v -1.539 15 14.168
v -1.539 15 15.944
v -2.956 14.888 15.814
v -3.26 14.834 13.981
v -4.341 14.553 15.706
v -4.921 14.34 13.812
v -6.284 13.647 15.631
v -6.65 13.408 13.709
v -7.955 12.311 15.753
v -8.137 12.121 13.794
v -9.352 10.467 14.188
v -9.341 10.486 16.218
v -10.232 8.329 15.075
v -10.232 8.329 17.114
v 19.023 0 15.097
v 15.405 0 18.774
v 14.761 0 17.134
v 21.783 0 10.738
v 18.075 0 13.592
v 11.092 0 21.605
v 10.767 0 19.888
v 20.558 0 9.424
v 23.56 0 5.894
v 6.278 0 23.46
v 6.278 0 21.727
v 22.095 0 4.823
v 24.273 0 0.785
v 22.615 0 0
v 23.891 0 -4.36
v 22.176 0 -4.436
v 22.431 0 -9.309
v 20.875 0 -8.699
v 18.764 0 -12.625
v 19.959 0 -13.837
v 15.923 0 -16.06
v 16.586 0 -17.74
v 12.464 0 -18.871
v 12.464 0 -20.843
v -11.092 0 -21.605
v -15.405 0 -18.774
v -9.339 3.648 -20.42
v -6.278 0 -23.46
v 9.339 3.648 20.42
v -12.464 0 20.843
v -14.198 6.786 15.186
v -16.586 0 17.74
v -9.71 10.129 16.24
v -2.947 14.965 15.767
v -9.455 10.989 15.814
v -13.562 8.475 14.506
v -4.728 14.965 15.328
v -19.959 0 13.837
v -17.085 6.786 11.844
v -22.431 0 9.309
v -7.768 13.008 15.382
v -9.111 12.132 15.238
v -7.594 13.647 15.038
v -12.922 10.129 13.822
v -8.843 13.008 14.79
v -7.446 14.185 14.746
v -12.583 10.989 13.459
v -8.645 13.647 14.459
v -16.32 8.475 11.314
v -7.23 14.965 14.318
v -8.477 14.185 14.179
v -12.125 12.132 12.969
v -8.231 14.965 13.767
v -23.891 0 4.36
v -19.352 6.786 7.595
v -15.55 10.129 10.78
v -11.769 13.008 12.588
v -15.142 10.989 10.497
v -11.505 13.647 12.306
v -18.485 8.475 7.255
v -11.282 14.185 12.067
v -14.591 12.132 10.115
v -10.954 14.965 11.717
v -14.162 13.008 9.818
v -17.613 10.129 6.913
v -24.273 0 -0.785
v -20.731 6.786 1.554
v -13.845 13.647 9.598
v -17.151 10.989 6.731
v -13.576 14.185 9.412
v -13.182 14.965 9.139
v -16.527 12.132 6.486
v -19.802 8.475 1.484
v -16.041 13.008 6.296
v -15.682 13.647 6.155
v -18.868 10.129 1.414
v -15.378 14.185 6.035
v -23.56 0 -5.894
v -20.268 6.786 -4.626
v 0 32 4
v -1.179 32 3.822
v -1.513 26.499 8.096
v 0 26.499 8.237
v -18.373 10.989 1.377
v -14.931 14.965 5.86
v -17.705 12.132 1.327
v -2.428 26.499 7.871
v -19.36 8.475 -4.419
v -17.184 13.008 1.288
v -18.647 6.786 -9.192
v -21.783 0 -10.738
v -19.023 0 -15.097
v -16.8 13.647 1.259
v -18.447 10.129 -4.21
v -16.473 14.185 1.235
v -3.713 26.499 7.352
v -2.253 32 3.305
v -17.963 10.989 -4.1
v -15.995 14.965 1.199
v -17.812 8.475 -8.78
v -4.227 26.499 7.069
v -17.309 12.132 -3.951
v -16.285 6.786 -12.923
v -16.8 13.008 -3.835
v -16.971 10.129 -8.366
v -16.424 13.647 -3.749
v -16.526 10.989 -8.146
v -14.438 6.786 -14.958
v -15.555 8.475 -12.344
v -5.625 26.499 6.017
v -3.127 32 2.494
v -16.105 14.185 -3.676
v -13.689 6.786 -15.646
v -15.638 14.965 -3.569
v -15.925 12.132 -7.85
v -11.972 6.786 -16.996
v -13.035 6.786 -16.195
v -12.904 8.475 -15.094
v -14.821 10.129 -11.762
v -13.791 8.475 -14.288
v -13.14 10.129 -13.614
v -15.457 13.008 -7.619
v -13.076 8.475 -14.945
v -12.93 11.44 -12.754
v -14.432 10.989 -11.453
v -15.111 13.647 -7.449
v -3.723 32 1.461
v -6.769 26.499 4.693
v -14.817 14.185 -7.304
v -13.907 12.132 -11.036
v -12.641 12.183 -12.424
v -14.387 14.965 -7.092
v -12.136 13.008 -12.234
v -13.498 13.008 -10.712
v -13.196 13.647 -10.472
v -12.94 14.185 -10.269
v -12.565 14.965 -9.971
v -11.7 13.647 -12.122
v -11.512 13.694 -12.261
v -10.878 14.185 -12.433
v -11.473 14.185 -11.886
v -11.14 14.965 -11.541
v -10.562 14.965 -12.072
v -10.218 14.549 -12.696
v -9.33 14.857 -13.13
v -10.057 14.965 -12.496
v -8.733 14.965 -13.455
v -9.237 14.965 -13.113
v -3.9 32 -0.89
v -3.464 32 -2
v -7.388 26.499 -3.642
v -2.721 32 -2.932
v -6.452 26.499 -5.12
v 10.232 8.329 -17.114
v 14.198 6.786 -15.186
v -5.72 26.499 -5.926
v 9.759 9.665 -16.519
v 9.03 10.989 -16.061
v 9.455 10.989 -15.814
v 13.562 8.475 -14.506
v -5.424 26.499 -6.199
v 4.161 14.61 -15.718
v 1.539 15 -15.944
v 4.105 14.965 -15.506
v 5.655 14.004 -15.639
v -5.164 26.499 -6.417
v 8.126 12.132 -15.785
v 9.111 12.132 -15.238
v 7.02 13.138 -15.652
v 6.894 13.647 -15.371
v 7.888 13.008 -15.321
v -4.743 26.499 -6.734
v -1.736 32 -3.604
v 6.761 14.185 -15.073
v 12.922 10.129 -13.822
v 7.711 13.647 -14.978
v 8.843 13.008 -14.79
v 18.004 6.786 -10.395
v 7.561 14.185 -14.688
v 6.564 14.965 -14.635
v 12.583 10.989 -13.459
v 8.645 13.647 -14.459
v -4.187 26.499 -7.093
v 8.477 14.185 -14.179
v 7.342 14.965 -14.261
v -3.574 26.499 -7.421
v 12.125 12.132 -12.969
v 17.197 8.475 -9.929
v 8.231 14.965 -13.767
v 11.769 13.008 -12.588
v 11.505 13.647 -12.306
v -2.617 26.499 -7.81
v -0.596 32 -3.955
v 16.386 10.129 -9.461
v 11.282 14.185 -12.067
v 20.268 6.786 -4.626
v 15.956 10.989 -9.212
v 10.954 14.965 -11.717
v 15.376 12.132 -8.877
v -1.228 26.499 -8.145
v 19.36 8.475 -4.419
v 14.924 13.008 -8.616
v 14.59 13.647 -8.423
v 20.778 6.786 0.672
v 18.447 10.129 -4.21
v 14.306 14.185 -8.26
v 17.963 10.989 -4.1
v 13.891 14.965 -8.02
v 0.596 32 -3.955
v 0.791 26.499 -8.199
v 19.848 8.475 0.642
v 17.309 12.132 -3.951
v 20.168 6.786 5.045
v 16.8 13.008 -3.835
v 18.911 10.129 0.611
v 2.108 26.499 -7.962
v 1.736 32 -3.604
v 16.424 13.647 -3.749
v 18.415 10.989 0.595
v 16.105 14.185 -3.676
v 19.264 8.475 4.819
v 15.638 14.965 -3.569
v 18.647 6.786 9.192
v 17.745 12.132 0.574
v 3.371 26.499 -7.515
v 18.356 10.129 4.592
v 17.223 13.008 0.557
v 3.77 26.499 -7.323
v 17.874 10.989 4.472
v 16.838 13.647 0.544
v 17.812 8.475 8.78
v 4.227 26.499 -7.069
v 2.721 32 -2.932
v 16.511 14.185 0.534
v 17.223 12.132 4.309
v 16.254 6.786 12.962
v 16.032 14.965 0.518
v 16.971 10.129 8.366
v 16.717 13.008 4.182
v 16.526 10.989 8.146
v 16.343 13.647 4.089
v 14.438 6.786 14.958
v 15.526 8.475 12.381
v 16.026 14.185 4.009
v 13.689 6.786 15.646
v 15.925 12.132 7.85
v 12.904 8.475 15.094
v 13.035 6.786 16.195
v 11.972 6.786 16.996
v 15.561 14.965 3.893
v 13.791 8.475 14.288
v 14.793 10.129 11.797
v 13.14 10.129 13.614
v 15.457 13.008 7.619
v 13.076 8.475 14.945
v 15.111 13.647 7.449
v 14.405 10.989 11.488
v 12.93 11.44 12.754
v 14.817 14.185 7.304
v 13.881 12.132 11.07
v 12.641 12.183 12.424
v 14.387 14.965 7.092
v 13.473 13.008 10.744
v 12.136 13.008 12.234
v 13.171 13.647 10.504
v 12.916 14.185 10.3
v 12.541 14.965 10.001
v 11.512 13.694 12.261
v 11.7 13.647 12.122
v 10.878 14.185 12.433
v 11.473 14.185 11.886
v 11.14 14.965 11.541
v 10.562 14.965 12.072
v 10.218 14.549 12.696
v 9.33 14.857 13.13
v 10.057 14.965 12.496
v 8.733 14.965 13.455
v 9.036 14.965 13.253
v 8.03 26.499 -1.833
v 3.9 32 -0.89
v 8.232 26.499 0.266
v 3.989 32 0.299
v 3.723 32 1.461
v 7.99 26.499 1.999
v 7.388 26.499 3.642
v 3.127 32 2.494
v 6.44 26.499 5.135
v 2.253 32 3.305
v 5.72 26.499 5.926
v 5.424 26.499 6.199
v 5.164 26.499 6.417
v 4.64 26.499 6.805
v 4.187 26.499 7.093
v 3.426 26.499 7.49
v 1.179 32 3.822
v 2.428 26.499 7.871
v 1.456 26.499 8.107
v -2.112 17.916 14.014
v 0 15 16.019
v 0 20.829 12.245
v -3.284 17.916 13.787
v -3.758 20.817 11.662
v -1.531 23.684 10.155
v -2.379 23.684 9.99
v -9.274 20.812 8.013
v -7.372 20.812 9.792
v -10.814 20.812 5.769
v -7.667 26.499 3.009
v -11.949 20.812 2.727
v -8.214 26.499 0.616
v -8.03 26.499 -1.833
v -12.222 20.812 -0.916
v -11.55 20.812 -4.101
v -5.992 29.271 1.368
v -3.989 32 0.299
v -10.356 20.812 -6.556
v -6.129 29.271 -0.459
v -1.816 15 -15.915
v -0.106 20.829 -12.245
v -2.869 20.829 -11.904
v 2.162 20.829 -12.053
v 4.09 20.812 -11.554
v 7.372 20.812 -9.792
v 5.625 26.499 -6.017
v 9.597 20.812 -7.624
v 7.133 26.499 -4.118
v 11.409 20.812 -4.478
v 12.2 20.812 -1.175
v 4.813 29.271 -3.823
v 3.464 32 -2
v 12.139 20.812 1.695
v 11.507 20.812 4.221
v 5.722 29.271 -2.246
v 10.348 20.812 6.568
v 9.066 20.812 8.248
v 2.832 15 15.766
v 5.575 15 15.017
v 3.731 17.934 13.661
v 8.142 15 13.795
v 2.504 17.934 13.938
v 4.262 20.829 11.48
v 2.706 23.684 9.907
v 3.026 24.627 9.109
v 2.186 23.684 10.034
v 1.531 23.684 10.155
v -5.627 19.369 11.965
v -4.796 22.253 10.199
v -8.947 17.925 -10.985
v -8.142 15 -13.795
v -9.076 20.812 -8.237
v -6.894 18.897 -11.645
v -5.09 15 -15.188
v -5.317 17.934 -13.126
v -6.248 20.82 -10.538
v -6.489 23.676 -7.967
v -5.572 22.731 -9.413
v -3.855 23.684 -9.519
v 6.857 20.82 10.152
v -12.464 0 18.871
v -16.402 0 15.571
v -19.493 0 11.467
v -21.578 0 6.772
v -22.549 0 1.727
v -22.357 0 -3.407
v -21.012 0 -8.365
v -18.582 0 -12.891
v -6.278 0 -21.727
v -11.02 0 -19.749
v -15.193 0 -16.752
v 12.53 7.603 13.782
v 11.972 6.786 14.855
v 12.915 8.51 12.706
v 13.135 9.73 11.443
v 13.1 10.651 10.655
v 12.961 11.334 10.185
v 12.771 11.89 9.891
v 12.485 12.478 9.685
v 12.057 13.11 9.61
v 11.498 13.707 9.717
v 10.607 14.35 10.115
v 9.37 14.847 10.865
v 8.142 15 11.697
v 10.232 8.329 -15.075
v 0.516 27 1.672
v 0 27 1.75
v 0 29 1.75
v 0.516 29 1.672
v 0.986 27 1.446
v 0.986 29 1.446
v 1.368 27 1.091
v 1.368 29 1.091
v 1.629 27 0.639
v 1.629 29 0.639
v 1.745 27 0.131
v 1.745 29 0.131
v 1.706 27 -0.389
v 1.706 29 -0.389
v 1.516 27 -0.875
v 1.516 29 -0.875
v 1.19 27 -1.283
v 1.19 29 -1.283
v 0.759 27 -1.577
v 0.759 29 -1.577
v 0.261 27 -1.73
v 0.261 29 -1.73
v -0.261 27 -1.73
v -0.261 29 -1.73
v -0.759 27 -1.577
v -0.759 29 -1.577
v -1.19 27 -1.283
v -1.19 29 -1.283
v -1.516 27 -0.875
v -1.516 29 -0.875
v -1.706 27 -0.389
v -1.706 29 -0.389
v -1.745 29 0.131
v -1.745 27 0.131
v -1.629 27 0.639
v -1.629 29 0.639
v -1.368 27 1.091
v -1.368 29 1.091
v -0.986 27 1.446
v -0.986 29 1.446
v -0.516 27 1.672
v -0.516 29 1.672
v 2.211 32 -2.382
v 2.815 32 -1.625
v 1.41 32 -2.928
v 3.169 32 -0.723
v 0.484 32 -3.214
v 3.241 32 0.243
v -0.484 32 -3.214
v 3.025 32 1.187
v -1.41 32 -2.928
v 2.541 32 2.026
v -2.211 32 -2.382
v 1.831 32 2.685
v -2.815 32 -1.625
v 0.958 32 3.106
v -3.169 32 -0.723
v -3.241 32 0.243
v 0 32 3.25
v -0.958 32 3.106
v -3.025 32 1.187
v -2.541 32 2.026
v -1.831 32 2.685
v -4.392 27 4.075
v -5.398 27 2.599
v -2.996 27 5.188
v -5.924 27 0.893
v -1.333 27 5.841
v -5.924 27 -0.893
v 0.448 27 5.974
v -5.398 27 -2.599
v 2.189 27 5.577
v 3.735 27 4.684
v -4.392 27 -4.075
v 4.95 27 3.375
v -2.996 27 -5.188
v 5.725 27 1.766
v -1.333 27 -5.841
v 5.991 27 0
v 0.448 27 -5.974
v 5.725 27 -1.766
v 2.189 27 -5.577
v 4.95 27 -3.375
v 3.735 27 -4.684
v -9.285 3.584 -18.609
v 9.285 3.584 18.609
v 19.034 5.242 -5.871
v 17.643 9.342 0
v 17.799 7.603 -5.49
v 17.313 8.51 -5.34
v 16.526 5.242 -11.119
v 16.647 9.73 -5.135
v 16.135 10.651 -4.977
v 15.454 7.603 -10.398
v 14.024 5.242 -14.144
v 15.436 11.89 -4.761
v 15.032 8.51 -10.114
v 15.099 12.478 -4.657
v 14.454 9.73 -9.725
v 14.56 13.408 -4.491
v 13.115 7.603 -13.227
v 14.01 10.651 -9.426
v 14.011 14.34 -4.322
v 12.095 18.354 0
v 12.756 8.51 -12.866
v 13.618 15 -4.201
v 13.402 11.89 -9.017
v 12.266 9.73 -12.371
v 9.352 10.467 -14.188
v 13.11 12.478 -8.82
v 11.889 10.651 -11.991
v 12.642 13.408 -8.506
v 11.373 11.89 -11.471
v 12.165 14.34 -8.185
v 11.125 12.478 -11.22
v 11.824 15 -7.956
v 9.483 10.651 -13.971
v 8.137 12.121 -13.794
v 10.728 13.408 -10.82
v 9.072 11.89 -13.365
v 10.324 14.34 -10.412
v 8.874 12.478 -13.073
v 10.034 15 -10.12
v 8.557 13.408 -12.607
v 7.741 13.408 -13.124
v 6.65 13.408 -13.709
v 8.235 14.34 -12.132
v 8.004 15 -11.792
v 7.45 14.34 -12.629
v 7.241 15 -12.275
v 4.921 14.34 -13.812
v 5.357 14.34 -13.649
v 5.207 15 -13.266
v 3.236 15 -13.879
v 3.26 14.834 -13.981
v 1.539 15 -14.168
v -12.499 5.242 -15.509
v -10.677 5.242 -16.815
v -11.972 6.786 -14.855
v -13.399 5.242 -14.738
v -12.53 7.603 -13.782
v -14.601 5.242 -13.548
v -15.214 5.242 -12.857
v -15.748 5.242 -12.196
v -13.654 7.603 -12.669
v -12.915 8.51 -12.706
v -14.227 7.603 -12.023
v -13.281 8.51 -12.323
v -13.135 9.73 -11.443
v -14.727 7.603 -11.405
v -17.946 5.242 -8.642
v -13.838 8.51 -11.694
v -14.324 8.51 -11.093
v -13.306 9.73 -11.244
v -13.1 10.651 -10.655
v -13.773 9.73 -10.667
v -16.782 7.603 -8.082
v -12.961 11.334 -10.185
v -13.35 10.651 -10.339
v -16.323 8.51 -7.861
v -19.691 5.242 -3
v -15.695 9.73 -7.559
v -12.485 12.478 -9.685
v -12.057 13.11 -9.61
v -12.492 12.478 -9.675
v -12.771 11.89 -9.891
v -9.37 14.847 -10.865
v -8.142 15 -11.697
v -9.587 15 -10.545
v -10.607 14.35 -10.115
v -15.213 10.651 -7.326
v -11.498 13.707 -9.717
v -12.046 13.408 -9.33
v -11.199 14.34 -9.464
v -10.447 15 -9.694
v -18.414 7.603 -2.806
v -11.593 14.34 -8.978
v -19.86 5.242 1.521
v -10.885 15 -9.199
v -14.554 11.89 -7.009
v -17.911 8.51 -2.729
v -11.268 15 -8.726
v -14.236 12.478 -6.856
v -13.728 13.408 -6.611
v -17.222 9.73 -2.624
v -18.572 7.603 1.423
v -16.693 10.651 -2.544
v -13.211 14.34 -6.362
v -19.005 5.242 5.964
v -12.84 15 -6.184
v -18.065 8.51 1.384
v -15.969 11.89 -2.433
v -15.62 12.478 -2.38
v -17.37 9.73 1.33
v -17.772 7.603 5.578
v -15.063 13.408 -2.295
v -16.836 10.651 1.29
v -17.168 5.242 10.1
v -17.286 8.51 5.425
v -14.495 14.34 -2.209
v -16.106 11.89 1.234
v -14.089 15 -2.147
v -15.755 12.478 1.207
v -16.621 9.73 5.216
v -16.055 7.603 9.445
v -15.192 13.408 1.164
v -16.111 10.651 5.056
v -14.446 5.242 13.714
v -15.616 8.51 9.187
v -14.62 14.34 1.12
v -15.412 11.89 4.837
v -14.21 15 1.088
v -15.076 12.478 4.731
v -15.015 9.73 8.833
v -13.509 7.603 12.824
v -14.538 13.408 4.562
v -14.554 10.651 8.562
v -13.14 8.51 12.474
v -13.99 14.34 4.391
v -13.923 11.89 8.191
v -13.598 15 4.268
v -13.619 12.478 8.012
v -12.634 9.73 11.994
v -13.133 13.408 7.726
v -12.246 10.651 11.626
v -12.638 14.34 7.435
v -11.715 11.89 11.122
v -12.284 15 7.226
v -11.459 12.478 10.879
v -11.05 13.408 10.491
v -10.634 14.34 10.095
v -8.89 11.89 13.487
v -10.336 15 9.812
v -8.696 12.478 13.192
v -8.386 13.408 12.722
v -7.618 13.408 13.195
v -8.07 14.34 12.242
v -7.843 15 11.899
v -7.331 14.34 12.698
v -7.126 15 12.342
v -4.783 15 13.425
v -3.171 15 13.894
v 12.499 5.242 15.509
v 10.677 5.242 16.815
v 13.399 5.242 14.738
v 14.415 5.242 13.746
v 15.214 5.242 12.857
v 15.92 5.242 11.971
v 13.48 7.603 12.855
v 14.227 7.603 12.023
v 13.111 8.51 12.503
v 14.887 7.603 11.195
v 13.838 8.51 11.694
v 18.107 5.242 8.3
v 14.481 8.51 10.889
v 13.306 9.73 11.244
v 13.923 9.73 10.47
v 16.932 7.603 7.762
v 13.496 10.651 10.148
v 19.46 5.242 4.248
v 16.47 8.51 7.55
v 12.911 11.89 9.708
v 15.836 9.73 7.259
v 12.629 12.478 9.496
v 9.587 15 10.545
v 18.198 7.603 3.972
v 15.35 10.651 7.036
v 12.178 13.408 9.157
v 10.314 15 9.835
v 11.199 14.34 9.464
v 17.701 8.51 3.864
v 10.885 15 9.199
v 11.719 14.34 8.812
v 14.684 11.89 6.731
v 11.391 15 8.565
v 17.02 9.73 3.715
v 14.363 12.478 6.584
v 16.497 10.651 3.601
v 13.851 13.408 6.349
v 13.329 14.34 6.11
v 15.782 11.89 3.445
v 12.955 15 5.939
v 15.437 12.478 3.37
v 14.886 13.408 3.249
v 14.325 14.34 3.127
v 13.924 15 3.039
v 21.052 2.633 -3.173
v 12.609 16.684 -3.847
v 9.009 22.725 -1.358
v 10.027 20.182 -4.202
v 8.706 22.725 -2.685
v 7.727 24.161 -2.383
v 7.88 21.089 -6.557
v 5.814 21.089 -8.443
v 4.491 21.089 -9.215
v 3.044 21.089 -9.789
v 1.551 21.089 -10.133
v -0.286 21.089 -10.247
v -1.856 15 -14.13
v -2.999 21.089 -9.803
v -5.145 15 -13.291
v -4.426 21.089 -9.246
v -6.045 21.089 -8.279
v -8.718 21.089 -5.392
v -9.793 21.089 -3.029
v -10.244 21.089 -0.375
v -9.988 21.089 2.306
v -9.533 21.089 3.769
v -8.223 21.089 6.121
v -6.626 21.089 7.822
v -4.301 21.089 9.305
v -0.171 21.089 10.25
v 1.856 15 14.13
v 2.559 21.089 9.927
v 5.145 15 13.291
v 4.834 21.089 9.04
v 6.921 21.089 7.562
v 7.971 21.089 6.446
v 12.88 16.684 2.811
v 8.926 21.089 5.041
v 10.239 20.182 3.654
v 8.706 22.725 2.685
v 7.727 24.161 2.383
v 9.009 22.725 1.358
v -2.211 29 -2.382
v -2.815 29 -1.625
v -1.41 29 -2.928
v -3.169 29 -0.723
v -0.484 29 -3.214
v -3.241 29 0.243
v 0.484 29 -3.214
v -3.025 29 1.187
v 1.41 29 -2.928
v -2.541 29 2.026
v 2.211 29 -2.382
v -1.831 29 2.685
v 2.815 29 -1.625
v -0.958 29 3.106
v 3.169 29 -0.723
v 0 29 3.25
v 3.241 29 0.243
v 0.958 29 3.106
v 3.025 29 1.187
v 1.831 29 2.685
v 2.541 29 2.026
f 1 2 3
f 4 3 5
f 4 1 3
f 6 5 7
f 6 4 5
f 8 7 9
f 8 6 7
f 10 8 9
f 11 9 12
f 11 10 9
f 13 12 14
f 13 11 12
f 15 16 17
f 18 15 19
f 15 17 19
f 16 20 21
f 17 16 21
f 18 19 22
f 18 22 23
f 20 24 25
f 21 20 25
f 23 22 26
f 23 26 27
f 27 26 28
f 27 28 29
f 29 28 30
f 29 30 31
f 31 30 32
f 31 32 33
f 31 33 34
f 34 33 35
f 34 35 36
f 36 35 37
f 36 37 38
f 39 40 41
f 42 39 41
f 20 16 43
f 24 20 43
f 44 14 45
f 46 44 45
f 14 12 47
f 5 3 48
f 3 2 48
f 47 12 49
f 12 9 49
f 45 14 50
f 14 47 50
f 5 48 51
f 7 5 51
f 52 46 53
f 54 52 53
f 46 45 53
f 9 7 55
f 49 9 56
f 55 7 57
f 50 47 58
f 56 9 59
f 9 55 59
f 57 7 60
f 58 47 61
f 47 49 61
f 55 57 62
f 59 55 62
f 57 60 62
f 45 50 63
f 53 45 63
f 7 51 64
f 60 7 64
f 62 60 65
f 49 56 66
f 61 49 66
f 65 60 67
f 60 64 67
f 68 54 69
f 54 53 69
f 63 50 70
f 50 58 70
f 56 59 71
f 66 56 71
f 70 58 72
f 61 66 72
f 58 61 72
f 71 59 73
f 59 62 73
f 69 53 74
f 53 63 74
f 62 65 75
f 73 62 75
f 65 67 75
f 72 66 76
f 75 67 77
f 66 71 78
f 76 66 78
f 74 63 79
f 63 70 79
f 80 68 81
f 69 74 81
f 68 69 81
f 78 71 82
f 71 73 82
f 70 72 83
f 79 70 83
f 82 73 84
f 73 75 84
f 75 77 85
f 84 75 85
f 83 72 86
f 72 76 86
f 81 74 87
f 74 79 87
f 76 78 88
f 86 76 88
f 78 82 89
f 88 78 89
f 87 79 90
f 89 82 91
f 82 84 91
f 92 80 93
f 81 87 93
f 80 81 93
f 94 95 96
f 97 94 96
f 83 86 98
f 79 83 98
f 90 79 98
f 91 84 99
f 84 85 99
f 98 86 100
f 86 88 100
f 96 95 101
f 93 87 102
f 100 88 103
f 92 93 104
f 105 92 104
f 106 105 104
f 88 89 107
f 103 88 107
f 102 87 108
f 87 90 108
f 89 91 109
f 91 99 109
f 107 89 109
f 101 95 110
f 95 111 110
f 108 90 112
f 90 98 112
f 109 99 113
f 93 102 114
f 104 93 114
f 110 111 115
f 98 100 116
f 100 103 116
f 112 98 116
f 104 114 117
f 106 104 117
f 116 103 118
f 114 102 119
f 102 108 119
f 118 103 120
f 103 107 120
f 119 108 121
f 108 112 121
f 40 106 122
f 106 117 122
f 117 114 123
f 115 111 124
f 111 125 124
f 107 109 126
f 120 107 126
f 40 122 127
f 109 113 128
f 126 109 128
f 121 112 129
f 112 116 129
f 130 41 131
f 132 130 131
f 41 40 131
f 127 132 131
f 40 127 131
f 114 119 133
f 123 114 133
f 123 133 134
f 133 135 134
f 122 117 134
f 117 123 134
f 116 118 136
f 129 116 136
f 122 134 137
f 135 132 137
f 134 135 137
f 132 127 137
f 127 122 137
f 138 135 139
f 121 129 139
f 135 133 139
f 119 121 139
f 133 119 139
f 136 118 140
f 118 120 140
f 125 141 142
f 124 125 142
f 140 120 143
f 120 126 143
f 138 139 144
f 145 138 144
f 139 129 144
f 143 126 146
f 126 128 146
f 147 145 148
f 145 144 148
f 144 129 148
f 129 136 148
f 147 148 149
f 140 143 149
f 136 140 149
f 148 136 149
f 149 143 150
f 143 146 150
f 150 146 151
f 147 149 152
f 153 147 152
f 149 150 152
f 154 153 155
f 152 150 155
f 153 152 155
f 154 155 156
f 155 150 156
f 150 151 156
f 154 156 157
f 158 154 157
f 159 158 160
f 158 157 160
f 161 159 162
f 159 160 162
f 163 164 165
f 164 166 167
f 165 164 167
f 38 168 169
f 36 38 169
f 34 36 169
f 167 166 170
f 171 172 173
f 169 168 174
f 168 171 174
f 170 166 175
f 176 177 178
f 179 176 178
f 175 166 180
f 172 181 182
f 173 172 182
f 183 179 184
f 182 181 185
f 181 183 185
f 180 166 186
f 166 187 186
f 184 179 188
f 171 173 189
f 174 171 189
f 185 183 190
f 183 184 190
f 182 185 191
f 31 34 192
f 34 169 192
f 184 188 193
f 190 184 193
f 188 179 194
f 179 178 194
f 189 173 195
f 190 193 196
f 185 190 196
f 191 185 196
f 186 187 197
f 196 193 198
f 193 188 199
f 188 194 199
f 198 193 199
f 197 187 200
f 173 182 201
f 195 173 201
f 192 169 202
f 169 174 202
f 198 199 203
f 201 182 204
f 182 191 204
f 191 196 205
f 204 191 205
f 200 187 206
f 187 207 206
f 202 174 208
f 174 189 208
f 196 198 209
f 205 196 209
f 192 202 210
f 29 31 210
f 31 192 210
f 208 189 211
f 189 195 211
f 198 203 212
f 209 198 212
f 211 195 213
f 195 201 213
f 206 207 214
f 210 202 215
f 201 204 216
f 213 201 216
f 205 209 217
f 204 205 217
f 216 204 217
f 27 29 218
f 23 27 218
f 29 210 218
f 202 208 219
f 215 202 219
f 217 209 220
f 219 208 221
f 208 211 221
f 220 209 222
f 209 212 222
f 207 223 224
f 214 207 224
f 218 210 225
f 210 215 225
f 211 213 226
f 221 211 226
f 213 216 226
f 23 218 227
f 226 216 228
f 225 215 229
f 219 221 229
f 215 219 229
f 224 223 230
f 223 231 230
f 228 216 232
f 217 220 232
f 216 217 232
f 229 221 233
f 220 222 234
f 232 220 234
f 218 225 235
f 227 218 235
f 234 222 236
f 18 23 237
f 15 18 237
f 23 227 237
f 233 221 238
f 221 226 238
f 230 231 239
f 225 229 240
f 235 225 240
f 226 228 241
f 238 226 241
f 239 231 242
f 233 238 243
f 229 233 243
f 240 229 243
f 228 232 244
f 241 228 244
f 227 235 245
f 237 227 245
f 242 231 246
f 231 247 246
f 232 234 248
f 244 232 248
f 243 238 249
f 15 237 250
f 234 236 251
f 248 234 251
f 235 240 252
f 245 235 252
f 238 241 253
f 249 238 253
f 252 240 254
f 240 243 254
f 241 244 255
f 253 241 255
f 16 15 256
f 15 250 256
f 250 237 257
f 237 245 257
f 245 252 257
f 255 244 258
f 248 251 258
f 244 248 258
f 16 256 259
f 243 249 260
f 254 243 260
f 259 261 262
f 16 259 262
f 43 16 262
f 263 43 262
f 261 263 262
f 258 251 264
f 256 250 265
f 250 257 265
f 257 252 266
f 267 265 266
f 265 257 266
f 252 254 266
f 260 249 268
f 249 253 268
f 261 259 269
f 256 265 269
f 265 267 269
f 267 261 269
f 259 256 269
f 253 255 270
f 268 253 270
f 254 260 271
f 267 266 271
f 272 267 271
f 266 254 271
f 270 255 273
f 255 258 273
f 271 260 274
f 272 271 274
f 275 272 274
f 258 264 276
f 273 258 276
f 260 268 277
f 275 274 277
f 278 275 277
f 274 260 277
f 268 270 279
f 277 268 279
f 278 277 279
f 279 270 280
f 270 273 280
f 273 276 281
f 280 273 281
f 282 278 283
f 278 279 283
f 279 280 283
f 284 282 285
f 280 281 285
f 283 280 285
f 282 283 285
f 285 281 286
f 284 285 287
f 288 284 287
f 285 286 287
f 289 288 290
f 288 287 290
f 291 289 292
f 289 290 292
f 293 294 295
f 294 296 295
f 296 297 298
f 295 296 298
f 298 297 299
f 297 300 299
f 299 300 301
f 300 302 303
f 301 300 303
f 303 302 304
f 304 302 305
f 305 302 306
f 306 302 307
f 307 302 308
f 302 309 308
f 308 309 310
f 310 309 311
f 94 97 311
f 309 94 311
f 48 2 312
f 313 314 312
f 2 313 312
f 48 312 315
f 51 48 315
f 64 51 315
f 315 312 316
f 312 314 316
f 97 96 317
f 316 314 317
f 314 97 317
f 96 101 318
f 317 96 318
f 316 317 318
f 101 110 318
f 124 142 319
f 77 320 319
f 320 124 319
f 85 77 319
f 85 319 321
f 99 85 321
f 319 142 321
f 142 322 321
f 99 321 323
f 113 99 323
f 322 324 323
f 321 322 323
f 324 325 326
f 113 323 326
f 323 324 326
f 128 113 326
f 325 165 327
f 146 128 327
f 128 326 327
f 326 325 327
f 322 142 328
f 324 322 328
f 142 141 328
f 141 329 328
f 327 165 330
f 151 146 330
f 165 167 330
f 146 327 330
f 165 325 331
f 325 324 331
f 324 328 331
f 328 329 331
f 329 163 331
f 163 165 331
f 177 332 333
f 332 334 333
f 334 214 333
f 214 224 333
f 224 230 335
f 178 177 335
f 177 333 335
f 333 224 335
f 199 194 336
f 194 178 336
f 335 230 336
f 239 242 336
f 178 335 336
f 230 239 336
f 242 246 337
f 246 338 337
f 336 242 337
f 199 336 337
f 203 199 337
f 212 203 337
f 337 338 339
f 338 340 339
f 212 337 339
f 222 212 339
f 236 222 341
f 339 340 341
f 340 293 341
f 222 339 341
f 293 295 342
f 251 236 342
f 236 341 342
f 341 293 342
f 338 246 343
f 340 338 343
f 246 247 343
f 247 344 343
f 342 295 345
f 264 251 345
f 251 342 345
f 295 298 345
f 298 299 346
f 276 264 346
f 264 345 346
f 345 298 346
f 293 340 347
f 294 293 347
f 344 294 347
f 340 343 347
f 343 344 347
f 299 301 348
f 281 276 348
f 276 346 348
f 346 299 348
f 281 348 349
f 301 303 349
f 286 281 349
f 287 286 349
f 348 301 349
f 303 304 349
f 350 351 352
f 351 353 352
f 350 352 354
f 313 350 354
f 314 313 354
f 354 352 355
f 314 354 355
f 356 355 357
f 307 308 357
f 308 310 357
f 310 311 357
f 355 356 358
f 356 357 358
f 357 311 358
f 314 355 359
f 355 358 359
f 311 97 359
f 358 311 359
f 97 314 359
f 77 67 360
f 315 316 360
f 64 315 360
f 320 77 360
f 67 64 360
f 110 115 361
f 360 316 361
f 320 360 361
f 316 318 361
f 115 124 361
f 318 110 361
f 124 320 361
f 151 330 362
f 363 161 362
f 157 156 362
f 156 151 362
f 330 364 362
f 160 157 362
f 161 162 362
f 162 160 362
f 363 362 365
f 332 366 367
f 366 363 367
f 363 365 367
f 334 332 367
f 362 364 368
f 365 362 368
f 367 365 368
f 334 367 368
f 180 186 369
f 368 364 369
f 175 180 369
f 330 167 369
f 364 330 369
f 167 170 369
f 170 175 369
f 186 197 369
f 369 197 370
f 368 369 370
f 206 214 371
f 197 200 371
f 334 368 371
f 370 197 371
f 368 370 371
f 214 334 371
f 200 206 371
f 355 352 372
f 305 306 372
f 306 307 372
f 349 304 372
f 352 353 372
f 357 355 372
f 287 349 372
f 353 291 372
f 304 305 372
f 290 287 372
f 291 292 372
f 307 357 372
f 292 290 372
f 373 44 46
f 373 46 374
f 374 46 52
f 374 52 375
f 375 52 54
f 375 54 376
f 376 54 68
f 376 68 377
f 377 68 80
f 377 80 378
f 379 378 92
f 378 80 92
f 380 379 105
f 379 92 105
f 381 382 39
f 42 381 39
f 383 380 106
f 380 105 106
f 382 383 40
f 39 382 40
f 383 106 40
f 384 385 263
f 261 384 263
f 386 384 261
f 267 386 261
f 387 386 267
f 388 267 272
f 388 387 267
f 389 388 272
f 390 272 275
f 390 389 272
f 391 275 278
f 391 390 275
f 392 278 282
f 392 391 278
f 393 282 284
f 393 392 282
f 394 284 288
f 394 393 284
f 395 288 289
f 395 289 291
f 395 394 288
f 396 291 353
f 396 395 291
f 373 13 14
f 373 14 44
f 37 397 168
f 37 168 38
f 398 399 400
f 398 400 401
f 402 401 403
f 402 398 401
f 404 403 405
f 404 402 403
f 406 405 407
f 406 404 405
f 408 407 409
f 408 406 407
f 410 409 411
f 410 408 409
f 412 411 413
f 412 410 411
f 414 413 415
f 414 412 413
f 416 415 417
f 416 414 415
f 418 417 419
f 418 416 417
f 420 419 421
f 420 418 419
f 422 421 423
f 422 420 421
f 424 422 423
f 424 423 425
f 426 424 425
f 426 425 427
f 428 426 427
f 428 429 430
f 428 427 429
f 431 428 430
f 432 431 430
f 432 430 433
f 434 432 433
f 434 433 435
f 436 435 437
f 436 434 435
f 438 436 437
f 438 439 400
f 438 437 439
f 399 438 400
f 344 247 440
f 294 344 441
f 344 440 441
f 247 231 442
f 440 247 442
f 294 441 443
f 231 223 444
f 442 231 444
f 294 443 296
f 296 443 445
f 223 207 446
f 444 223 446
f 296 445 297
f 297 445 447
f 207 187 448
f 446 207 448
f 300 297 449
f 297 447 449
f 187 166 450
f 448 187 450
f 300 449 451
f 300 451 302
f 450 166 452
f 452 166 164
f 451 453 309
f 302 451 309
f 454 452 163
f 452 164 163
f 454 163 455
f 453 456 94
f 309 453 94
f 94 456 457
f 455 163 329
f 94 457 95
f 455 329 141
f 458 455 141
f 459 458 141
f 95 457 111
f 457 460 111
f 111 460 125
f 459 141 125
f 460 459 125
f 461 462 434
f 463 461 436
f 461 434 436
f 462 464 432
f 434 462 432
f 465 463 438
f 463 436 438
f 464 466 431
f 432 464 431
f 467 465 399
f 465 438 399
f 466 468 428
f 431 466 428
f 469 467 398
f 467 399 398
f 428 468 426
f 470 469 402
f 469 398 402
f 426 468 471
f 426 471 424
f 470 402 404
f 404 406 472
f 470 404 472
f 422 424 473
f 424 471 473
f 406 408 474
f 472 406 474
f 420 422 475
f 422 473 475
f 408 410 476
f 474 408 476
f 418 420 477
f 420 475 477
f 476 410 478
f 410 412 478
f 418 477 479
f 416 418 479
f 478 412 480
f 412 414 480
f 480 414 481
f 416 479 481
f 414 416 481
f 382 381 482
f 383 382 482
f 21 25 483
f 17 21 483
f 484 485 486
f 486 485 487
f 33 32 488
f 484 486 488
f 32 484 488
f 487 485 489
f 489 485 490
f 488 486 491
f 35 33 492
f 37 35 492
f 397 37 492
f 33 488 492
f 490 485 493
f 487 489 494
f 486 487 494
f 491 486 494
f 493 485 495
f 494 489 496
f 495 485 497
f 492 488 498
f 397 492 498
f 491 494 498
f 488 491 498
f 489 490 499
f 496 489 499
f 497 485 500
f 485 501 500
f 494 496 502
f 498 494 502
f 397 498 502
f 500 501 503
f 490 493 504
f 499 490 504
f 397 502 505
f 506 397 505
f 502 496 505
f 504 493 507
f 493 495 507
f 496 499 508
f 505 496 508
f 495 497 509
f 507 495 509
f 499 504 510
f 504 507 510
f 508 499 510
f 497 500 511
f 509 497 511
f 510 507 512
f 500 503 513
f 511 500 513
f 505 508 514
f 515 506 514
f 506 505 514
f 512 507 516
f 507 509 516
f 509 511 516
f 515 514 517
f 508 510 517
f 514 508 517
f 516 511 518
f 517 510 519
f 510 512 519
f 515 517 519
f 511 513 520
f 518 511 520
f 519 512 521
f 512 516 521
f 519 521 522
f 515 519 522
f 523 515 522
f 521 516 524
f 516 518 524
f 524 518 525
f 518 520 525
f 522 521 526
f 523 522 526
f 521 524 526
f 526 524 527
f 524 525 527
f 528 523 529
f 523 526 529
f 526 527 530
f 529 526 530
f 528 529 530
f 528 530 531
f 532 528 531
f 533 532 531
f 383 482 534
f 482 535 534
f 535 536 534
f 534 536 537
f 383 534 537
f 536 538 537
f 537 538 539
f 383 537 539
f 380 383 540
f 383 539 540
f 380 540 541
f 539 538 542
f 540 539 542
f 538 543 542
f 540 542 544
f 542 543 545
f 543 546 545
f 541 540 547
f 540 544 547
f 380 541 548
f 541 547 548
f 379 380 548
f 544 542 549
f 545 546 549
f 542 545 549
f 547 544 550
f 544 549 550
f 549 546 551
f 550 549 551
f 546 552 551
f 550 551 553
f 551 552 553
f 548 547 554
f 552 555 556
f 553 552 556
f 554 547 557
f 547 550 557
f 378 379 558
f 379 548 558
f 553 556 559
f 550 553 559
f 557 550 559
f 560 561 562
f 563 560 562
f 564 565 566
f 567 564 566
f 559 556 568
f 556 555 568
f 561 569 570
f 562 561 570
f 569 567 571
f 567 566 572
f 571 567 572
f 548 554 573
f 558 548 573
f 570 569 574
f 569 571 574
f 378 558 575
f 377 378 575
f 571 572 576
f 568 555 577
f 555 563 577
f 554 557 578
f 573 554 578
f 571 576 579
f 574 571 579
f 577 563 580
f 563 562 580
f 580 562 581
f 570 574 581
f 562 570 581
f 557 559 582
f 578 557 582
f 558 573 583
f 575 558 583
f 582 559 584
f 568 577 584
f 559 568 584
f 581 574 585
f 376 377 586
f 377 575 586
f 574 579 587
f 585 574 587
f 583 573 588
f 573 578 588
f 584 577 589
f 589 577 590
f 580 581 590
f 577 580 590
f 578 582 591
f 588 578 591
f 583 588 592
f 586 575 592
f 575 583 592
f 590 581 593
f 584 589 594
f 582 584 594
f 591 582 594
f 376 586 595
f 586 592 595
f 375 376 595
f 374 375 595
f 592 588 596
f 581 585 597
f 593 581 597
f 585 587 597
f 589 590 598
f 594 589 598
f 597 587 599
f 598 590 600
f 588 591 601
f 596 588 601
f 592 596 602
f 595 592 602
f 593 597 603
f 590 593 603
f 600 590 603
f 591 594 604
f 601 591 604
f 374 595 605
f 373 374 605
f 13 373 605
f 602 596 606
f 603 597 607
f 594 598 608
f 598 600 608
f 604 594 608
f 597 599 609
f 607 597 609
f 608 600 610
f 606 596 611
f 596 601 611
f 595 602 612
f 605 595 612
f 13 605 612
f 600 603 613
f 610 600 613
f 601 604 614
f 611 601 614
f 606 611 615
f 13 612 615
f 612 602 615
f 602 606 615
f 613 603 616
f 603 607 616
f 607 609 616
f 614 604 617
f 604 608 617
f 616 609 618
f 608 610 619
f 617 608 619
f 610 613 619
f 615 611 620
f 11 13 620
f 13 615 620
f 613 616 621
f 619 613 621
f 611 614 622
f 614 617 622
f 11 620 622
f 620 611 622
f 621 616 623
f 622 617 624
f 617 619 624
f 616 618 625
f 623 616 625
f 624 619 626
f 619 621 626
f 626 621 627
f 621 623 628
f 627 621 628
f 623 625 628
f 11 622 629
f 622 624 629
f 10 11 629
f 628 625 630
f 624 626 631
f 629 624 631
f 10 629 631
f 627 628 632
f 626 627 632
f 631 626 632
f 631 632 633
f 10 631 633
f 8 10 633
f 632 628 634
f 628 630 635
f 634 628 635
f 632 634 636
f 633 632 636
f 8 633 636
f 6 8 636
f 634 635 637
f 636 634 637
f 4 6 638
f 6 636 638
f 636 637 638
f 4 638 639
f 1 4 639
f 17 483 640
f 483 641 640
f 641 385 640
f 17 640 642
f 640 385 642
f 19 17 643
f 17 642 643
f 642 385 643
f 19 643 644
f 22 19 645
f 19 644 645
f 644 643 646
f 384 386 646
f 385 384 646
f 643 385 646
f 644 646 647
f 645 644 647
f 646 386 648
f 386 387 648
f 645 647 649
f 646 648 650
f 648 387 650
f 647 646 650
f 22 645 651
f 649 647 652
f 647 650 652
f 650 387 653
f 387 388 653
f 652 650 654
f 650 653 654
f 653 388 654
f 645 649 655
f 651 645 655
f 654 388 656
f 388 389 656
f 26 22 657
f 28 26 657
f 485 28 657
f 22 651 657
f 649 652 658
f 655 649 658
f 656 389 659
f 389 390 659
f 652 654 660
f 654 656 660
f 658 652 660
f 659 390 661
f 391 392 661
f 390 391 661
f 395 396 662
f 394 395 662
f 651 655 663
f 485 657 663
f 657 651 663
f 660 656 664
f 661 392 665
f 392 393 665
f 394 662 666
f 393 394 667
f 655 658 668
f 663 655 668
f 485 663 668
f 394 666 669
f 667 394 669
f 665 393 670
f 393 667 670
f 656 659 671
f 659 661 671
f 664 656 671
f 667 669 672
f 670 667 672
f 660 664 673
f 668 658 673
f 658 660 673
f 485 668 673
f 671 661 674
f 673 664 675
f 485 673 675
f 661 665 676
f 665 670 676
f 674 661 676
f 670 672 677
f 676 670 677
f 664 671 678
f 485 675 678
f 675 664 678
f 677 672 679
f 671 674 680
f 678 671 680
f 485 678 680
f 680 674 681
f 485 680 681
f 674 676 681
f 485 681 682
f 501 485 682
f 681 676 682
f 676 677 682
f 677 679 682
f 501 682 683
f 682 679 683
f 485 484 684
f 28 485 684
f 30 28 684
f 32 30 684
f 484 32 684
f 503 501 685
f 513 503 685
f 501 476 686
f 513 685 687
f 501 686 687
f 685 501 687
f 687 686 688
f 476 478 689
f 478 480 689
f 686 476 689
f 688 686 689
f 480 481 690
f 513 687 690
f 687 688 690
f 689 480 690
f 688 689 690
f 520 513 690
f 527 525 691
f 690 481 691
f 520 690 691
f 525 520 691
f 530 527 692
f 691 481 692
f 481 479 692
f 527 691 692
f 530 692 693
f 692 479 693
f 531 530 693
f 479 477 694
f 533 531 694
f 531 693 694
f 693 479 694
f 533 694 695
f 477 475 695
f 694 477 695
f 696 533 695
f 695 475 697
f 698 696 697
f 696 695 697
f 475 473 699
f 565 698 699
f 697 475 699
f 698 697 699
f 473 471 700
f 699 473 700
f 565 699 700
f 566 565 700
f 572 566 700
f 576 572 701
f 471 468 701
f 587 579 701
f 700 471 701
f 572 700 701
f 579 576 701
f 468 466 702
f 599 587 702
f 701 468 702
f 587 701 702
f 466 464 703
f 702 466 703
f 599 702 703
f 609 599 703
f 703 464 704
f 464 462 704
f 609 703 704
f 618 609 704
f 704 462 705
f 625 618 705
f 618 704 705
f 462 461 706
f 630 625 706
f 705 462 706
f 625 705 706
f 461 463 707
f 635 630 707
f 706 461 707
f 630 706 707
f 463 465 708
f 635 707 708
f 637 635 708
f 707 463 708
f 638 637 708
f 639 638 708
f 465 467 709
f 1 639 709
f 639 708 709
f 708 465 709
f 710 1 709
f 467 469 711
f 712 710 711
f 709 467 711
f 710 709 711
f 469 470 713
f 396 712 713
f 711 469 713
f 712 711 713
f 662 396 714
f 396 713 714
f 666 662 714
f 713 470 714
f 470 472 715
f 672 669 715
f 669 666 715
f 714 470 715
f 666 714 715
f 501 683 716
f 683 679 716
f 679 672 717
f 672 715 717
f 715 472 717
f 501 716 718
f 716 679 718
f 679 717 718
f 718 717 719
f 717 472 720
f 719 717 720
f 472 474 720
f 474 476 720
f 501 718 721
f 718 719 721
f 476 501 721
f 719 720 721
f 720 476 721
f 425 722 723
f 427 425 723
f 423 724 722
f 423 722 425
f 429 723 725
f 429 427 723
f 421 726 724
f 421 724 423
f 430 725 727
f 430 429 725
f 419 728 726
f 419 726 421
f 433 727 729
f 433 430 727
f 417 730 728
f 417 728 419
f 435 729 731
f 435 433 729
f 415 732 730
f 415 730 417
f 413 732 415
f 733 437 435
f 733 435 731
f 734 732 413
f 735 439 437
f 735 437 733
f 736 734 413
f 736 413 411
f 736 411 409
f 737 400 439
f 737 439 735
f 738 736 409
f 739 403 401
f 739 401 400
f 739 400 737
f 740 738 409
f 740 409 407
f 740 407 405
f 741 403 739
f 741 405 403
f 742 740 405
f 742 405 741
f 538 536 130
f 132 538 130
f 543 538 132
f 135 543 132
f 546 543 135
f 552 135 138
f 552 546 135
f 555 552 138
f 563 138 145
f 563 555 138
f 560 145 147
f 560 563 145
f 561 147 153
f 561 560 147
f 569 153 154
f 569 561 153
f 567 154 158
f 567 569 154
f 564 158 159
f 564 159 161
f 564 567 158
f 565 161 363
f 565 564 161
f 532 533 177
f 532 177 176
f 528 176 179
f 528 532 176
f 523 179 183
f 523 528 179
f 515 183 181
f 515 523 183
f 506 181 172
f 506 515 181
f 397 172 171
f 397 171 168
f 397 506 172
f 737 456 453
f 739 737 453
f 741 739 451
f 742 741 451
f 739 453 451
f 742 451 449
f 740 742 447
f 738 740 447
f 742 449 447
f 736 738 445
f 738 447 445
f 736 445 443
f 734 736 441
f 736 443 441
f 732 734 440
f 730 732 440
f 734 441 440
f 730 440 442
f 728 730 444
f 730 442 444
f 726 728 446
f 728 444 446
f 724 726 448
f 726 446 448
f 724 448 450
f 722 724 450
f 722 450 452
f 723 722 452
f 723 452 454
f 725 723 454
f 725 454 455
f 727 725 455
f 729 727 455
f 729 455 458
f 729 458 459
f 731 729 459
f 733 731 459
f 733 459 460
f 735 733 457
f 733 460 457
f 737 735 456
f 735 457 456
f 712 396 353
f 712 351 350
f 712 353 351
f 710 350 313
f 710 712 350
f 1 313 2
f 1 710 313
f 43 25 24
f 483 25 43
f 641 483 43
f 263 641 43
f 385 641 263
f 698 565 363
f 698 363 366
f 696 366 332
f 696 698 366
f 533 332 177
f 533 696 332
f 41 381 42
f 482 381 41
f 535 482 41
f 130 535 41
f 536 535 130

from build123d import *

# Parameters (mm, degrees)
SKETCH_7_R               = 3.25
CUT_EXTRUDE_1_DEPTH      = 3
SKETCH_8_R               = 1.75
CUT_EXTRUDE_2_DEPTH      = 40
CUT_EXTRUDE_3_DEPTH      = 30
PATTERN_CIRCULAR_1_COUNT = 2


# Read off the part's stored shape, not the designer's step: 쉘1
with BuildPart() as part:
    # 스케치1 → 회전1 (revolve)
    with BuildSketch(Plane.XY, mode=Mode.PRIVATE) as revolve_1_sk:
        with BuildLine():
            Line((0, 32), (0, 0))
            Line((0, 0), (-24.285796176, 0))
            ThreePointArc((-24.285796176, 0), (-15.037169396, 16.566906421), (-4, 32))
            Line((-4, 32), (0, 32))
        make_face()
    revolve(revolve_1_sk.sketch.rotate(Axis((0, 108.7652361, 0), (0, -1, 0)), 270), axis=Axis((0, 108.7652361, 0), (0, -1, 0)))

    # 쉘1 outline → 쉘1 (revolve, cut)
    with BuildSketch(Plane.XY):
        with BuildLine():
            ThreePointArc((22.615498991, 0), (14.939810561, 13.89190703), (5.991113868, 27))
            Line((5.991113868, 27), (0, 27))
            Line((0, 27), (0, 0))
            Line((0, 0), (22.615498991, 0))
        make_face()
    revolve(axis=Axis((0, 0, 0), (0, 1, 0)), mode=Mode.SUBTRACT)

    # 스케치7 → 돌출1 (cut)
    with BuildSketch(Plane(origin=(0, 32, 0), x_dir=(1, 0, 0), z_dir=(0, 1, 0))):
        with Locations(Location((0, 0, 0), (0, 0, 270))):
            Circle(SKETCH_7_R)
    extrude(amount=-CUT_EXTRUDE_1_DEPTH, mode=Mode.SUBTRACT)

    # 스케치8 → 돌출2 (cut)
    with BuildSketch(Plane(origin=(0, 0, 0), x_dir=(1, 0, 0), z_dir=(0, 1, 0))):
        with Locations(Location((0, 0, 0), (0, 0, 270))):
            Circle(SKETCH_8_R)
    extrude(amount=CUT_EXTRUDE_2_DEPTH, mode=Mode.SUBTRACT)

    # 스케치9 → 돌출3 (cut)
    with BuildSketch(Plane.XY):
        with BuildLine():
            Line((-13, -2), (4.6, -2))
            Line((4.6, -2), (11.972381343, 6.786061952))
            ThreePointArc((11.972381343, 6.786061952), (12.673698063, 12.113091309), (8.142159127, 15))
            Line((8.142159127, 15), (-1.538920837, 15))
            ThreePointArc((-1.538920837, 15), (-7.017773698, 13.140180063), (-10.232253273, 8.329371406))
            Line((-10.232253273, 8.329371406), (-13, -2))
        make_face()
    cut_extrude_3 = extrude(amount=CUT_EXTRUDE_3_DEPTH, mode=Mode.SUBTRACT)

    # 원형 패턴1: 돌출3 ×2 about axis
    pattern_circular_1_axis = Axis((0, 40, 0), (0, -1, 0))
    for i in range(1, PATTERN_CIRCULAR_1_COUNT):
        add(cut_extrude_3.rotate(pattern_circular_1_axis, i * 360 / PATTERN_CIRCULAR_1_COUNT), mode=Mode.SUBTRACT)


solid = part.part
